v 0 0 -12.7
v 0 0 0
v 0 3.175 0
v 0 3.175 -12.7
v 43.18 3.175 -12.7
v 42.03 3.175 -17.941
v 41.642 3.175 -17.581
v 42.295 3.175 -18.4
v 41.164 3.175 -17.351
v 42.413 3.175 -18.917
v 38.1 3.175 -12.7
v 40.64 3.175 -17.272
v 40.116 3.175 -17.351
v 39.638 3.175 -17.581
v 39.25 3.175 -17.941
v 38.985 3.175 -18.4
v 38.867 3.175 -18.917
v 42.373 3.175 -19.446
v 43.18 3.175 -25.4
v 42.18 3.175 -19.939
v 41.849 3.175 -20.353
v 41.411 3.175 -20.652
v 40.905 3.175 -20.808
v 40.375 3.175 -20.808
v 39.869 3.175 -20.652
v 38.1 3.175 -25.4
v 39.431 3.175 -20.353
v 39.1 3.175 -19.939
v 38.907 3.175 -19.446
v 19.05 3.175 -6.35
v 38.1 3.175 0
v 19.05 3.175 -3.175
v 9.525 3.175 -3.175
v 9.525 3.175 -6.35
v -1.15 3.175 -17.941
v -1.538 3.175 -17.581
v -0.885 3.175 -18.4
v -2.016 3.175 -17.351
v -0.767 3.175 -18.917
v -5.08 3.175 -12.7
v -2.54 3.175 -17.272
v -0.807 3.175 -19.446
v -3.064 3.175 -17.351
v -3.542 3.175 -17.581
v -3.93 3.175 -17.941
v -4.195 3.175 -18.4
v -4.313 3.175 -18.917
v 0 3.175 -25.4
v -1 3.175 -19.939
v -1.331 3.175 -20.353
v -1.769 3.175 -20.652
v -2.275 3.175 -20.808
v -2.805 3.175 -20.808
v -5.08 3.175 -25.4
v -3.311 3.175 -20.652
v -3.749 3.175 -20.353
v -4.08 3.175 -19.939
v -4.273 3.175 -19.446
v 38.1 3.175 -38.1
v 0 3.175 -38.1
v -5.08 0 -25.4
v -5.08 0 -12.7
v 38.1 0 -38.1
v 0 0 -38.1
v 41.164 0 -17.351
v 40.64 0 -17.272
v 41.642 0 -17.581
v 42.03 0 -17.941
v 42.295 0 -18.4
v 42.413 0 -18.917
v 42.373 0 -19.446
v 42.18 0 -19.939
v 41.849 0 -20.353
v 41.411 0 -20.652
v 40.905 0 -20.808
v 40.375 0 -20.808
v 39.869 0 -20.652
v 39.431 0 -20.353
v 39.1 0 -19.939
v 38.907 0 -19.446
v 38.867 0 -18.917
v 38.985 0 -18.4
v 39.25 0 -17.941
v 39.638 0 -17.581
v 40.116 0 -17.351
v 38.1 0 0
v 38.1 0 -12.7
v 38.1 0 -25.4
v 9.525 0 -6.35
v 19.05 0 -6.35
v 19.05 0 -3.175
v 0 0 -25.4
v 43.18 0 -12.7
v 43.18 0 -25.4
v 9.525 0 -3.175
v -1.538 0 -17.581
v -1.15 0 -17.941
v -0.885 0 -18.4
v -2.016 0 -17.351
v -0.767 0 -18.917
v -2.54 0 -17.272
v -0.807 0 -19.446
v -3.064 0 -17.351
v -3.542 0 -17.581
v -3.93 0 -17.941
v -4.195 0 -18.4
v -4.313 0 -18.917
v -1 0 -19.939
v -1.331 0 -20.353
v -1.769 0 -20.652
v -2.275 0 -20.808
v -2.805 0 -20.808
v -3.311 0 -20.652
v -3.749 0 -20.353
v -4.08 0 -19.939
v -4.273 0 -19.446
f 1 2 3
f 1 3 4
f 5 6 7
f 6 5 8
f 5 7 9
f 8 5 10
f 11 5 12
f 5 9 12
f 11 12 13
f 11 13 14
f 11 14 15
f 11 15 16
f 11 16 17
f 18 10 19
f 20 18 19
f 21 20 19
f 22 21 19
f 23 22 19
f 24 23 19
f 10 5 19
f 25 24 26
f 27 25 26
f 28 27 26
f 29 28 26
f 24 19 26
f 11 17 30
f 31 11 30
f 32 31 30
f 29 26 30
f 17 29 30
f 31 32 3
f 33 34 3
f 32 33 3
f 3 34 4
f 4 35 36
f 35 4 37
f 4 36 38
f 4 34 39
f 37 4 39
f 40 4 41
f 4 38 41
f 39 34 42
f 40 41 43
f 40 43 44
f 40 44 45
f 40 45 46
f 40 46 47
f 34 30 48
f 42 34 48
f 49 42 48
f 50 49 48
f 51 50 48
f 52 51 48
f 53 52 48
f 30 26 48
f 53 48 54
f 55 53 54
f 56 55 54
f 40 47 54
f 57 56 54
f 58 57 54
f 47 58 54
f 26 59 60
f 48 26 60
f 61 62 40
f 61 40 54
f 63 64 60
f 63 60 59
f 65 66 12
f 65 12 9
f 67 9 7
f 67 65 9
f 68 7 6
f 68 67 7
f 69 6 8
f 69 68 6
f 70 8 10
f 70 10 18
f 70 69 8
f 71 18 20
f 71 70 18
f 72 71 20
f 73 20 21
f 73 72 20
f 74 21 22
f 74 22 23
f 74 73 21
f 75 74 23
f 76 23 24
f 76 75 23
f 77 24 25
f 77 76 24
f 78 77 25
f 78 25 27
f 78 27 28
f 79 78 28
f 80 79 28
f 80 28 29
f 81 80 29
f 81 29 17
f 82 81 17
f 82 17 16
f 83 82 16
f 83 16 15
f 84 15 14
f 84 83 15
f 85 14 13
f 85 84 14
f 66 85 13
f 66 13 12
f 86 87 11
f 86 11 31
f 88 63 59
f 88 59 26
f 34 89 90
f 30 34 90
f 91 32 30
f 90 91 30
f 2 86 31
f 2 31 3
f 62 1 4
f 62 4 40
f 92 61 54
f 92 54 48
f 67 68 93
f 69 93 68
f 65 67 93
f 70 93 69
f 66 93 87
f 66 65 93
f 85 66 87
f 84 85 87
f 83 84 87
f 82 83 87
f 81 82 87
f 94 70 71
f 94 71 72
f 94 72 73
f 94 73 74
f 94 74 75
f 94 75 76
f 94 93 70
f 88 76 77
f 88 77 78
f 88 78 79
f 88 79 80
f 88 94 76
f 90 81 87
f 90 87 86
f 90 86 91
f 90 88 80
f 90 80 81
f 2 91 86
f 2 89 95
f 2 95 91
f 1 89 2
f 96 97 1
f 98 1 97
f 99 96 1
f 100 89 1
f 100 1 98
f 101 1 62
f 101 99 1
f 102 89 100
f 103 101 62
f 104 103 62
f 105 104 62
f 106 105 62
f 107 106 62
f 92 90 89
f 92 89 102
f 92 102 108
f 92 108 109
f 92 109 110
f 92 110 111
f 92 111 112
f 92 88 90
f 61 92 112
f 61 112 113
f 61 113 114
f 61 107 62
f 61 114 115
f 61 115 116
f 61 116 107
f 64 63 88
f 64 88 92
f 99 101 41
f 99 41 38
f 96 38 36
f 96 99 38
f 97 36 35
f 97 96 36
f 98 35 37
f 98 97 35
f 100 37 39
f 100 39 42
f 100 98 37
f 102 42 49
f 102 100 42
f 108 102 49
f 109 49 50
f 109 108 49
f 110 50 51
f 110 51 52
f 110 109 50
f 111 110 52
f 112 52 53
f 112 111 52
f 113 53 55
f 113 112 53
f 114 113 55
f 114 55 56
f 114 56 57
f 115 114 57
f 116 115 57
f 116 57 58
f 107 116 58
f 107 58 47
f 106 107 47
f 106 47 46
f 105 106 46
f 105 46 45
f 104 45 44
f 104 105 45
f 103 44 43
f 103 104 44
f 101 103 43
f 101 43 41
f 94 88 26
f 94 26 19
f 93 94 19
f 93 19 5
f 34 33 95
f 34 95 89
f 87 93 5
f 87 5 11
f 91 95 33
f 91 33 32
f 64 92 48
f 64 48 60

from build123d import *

# Parameters (mm, degrees)
SKETCH1_R           = 1.778
SKETCH1_W           = 9.525
SKETCH1_H           = 3.175
BOSS_EXTRUDE1_DEPTH = 3.175


with BuildPart() as part:
    # Sketch1 → Boss-Extrude1 (new body)
    with BuildSketch(Plane(origin=(0, 0, 0), x_dir=(1, 0, 0), z_dir=(0, 1, 0))):
        Polygon((0, 0), (0, 12.7), (-5.08, 12.7), (-5.08, 25.4), (0, 25.4), (0, 38.1), (38.1, 38.1), (38.1, 25.4), (43.18, 25.4), (43.18, 12.7), (38.1, 12.7), (38.1, 0), align=None)
        with Locations(Location((-2.54, 19.05, 0), (0, 0, 270))):
            Circle(SKETCH1_R, mode=Mode.SUBTRACT)
        with Locations(Location((40.64, 19.05, 0), (0, 0, 270))):
            Circle(SKETCH1_R, mode=Mode.SUBTRACT)
        with Locations((14.2875, 4.7625)):
            Rectangle(SKETCH1_W, SKETCH1_H, mode=Mode.SUBTRACT)
    extrude(amount=BOSS_EXTRUDE1_DEPTH)


solid = part.part
